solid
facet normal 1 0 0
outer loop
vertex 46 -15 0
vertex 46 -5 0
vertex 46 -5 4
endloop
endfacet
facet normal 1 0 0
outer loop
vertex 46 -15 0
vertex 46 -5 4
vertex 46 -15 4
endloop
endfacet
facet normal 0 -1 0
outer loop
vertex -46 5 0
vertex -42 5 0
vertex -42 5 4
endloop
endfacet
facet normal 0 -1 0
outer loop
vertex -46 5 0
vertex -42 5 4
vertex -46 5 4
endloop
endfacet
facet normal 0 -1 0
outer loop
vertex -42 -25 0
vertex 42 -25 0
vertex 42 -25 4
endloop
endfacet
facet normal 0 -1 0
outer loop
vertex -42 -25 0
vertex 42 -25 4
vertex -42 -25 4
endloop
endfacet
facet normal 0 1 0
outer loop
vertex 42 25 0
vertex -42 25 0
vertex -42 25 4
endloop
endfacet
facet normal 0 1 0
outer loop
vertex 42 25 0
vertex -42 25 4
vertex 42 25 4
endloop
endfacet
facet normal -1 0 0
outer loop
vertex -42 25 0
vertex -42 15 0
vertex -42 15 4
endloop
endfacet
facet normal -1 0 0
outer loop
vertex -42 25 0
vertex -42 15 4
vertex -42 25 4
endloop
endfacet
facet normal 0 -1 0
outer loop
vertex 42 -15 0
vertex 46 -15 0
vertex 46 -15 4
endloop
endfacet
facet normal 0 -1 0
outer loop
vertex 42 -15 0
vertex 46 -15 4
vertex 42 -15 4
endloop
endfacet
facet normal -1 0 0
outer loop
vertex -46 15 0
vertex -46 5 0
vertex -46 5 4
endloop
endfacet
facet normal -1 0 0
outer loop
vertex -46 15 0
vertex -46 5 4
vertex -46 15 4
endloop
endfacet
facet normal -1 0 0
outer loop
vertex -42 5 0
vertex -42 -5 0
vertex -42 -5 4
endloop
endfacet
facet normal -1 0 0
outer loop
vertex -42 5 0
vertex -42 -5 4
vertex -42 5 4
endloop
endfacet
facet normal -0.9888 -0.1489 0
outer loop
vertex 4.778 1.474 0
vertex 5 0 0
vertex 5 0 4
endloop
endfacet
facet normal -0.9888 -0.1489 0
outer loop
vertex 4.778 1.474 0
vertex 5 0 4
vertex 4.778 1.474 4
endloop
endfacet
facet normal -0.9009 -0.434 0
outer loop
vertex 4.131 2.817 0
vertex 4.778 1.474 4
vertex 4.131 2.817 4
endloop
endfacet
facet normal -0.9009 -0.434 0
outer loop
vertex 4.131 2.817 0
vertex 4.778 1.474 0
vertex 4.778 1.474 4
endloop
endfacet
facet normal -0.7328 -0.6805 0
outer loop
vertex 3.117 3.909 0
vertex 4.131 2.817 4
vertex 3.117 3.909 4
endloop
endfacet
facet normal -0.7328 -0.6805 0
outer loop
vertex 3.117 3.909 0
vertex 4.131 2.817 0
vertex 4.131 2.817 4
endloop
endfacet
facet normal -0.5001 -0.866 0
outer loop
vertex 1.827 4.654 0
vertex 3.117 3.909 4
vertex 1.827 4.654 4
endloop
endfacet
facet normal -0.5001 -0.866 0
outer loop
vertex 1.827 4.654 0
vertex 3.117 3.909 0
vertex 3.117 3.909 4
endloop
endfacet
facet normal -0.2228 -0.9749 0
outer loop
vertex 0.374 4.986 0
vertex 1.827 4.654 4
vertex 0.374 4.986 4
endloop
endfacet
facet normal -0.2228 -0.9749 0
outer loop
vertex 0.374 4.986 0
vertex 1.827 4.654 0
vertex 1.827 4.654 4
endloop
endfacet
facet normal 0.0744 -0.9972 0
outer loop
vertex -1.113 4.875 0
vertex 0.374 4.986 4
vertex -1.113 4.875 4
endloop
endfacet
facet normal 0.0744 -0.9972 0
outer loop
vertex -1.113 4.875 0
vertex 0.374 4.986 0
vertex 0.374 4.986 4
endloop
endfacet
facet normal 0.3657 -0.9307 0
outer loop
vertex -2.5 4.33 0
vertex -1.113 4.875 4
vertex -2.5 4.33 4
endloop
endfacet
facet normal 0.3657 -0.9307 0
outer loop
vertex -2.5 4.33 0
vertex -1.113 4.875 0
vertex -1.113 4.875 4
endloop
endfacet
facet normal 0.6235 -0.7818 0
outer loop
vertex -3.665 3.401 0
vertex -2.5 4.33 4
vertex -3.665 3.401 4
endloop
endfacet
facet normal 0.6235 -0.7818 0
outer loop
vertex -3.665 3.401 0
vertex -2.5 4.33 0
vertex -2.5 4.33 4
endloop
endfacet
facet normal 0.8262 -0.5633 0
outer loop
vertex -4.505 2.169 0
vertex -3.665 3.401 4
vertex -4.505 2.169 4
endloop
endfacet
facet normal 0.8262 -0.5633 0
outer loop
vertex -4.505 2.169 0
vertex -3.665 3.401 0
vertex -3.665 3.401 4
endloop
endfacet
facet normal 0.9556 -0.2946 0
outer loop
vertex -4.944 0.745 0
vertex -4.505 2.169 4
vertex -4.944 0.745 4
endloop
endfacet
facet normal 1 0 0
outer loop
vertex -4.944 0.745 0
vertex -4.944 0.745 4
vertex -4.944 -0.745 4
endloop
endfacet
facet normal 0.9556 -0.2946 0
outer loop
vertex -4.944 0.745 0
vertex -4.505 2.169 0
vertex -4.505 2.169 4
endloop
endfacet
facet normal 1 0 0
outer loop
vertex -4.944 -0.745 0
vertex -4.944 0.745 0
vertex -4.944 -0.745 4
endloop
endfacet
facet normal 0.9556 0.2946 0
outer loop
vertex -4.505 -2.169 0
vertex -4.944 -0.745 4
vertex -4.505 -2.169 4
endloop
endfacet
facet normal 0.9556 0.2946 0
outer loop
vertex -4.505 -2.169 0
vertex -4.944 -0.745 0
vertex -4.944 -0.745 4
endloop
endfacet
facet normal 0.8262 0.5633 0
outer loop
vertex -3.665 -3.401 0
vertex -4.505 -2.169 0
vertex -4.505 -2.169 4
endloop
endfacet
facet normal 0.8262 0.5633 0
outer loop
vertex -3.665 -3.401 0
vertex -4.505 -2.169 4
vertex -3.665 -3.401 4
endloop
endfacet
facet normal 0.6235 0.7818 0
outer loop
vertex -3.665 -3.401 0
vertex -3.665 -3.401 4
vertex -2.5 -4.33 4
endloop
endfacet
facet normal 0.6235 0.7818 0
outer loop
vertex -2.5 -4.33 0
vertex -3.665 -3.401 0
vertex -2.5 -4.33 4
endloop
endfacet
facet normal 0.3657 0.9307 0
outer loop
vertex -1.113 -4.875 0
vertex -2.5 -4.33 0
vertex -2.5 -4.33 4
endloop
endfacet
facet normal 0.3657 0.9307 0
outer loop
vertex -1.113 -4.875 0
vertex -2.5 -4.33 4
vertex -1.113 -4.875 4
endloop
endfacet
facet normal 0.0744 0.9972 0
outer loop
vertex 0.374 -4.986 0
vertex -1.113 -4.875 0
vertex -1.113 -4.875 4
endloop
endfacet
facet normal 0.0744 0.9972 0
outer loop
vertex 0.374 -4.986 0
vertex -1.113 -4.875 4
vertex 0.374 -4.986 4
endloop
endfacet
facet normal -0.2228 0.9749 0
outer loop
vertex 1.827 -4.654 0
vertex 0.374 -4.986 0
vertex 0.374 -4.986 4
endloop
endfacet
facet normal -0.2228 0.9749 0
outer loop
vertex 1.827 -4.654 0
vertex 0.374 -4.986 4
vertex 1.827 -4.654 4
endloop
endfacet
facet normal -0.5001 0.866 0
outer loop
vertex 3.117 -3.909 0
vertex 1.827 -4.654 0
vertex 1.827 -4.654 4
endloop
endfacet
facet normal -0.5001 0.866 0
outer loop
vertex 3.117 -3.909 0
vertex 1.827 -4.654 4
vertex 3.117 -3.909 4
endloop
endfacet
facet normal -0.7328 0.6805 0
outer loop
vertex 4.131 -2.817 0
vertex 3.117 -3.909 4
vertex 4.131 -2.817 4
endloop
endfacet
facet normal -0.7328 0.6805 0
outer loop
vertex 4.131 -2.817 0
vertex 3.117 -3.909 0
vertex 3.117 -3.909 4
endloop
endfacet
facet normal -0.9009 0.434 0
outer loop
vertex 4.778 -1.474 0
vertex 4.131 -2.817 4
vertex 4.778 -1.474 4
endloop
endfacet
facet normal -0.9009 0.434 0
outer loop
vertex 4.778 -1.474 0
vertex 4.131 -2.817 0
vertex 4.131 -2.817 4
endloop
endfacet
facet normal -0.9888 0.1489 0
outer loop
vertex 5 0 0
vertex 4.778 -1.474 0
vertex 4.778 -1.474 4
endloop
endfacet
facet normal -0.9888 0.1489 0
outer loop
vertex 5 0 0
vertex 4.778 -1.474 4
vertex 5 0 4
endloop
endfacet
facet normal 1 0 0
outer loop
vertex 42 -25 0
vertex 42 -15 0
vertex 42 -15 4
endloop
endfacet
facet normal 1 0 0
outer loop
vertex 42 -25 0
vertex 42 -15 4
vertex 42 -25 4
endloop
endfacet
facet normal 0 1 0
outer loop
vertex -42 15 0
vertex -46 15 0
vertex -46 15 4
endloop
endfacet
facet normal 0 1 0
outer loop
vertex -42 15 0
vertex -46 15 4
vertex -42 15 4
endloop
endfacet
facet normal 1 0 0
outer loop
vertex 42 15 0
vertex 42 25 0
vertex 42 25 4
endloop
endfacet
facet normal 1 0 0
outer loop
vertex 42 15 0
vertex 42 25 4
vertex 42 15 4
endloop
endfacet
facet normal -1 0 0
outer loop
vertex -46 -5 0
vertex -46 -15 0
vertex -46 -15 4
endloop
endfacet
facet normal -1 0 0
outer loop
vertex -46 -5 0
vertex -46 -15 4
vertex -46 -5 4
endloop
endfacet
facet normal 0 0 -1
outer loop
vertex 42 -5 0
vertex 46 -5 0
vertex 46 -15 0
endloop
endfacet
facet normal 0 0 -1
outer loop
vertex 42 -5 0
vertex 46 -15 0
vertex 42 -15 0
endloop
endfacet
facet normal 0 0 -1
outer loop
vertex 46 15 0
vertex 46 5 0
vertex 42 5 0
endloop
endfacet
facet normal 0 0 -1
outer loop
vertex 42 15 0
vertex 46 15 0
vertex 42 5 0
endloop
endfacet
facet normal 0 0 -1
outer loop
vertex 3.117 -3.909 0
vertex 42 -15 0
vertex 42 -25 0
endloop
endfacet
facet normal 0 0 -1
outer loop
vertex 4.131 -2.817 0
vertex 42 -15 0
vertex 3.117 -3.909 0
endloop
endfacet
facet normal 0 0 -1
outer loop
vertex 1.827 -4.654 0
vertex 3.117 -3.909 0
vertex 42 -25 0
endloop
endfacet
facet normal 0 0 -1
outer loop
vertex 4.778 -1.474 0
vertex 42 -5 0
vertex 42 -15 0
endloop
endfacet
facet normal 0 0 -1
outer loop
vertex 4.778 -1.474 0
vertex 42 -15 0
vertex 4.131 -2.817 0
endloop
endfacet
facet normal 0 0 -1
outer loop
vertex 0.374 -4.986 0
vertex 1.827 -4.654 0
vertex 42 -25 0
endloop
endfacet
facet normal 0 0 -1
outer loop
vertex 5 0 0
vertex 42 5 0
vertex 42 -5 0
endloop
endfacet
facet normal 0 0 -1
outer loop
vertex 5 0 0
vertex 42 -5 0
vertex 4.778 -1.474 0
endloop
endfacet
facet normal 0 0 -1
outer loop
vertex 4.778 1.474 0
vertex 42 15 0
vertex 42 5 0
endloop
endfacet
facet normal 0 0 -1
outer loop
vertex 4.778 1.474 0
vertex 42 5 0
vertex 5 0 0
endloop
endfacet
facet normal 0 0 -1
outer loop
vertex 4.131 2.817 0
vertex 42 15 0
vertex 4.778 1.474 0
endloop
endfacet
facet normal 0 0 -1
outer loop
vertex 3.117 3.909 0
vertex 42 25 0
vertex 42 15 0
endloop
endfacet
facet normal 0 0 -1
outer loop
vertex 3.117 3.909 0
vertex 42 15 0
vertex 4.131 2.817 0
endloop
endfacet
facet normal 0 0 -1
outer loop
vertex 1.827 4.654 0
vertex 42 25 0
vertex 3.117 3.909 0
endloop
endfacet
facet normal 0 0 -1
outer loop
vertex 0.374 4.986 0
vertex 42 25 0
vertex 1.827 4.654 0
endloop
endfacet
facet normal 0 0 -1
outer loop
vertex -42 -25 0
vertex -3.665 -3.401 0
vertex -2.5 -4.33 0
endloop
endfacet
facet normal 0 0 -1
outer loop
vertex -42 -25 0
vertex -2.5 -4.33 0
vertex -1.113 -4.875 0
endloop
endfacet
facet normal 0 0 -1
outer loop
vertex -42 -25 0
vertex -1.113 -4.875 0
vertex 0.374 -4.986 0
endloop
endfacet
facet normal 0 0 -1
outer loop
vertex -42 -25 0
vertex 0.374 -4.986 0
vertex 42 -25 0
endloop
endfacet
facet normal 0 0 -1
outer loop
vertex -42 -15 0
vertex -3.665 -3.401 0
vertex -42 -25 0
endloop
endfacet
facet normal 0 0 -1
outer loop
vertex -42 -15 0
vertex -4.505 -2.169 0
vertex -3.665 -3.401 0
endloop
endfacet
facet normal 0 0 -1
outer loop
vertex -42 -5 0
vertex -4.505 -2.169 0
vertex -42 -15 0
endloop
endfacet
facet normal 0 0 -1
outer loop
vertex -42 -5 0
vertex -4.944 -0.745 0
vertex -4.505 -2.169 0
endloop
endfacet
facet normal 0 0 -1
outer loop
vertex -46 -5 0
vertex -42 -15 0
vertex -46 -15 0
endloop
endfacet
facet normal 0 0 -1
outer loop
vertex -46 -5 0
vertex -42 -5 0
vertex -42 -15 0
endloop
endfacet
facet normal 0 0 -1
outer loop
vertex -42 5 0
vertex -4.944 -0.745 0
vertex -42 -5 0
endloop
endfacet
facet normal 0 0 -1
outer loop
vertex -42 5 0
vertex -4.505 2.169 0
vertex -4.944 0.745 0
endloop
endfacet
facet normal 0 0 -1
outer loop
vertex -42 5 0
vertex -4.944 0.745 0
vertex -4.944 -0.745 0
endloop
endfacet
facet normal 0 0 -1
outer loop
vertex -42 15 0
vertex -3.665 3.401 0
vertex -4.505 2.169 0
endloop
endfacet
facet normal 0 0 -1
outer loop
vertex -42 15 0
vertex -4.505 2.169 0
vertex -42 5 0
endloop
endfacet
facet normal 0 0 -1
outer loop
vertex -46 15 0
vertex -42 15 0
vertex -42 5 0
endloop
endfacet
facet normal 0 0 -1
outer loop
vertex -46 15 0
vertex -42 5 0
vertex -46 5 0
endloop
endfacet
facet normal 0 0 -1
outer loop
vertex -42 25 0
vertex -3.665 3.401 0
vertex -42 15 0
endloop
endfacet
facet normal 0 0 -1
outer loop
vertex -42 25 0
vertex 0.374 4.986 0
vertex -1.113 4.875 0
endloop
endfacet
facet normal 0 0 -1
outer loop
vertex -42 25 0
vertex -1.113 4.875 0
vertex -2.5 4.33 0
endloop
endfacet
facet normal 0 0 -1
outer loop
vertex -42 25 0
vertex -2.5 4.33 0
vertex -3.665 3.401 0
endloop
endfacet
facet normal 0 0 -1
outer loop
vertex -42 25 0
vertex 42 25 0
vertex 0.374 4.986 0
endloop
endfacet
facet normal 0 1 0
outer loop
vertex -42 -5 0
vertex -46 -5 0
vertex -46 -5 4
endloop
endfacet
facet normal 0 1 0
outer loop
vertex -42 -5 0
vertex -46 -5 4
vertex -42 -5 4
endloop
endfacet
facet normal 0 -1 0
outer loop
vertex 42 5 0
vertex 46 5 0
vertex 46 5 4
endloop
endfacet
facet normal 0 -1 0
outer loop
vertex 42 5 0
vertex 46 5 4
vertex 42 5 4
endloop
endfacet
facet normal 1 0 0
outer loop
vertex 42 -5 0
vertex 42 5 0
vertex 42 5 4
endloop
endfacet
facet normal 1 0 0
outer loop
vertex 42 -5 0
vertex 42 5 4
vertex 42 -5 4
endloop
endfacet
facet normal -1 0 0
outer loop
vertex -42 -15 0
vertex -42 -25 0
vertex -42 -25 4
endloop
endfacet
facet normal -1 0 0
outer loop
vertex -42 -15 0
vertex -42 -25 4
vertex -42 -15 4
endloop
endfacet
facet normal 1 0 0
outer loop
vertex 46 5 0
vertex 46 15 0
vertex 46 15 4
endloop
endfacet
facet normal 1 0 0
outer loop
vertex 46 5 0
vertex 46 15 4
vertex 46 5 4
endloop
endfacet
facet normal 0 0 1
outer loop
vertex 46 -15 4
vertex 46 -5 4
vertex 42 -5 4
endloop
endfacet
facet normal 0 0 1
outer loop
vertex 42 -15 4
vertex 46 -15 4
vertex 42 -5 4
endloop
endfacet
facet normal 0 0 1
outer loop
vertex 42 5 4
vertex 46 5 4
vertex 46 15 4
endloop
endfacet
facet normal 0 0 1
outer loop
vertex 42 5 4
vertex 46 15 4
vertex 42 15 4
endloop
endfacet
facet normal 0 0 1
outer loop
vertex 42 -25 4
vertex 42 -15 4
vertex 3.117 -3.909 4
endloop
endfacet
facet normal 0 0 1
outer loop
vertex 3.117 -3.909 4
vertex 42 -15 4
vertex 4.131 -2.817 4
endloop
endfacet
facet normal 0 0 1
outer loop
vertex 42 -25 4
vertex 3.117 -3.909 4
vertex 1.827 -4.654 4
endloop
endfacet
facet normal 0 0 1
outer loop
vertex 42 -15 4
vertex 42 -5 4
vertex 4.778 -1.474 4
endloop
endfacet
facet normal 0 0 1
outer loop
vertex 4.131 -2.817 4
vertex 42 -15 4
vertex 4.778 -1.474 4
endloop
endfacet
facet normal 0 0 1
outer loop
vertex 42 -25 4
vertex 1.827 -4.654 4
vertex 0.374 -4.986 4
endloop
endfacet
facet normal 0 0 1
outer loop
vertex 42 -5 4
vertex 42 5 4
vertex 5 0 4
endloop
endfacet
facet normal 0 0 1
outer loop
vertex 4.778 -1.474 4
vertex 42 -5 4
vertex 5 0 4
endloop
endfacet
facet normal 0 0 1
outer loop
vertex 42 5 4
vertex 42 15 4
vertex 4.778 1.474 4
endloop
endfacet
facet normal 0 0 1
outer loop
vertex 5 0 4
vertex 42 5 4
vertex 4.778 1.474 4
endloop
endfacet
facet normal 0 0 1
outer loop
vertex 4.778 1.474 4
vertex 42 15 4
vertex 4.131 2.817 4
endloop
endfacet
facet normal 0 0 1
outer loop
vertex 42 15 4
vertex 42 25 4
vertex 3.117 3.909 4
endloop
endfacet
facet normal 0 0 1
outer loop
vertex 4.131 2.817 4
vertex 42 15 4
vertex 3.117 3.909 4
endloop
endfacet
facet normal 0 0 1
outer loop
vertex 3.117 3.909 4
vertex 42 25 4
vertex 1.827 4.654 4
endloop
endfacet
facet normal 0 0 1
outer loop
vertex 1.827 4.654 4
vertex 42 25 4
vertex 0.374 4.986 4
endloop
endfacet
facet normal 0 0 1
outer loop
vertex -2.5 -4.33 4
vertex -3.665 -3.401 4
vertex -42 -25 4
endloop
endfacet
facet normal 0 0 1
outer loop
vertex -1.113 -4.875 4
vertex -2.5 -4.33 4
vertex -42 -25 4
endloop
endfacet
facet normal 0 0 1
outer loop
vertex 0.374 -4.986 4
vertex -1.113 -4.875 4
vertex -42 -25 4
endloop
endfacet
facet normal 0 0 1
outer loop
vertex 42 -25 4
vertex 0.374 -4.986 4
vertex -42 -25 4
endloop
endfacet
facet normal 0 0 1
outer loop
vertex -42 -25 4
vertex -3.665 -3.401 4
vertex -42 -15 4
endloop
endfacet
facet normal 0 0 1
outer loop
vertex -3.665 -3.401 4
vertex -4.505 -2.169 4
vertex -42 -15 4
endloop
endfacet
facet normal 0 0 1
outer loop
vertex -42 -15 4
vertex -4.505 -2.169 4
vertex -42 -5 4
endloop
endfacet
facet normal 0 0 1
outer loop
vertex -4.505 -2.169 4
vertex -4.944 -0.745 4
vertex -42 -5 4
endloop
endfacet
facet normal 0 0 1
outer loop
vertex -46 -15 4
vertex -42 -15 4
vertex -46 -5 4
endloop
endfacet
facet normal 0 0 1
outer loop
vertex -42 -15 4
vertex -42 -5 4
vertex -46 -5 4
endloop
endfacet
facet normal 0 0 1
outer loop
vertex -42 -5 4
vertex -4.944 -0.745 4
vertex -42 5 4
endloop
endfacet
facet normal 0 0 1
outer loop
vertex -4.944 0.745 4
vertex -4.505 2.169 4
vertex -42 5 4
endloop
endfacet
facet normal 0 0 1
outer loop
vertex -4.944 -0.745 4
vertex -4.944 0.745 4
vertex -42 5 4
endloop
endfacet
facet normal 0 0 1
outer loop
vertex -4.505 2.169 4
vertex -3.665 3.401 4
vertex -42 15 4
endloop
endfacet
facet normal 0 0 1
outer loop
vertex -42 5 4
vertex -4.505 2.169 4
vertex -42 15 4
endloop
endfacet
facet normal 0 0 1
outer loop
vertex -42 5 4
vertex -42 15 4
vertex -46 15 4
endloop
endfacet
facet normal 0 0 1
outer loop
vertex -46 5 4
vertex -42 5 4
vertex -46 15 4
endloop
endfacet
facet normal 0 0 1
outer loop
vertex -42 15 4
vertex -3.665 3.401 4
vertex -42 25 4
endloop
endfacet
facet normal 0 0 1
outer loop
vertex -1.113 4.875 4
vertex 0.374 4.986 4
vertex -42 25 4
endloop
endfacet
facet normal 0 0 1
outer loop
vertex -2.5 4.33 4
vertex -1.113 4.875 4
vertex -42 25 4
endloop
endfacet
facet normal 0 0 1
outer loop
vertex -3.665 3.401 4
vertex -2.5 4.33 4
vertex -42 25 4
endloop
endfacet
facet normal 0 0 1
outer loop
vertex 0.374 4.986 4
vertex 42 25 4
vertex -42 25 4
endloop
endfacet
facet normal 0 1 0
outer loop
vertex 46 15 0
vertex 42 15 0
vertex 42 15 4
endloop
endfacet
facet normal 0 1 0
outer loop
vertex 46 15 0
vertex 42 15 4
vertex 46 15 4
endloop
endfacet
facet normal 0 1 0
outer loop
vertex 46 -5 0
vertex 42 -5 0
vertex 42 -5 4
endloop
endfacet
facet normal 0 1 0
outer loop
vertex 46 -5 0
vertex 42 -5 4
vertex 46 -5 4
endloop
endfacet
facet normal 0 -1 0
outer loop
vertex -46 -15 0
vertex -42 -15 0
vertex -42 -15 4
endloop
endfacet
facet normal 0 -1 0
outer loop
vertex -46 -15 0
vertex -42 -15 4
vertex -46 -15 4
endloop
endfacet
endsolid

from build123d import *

# Parameters (mm, degrees)
SKETCH1_R           = 5
BOSS_EXTRUDE1_DEPTH = 4


with BuildPart() as part:
    # Sketch1 → Boss-Extrude1 (new body)
    with BuildSketch(Plane.XY):
        Polygon((-46, 5), (-46, 15), (-42, 15), (-42, 25), (42, 25), (42, 15), (46, 15), (46, 5), (42, 5), (42, -5), (46, -5), (46, -15), (42, -15), (42, -25), (-42, -25), (-42, -15), (-46, -15), (-46, -5), (-42, -5), (-42, 5), align=None)
        Circle(SKETCH1_R, mode=Mode.SUBTRACT)
    extrude(amount=BOSS_EXTRUDE1_DEPTH)


solid = part.part
